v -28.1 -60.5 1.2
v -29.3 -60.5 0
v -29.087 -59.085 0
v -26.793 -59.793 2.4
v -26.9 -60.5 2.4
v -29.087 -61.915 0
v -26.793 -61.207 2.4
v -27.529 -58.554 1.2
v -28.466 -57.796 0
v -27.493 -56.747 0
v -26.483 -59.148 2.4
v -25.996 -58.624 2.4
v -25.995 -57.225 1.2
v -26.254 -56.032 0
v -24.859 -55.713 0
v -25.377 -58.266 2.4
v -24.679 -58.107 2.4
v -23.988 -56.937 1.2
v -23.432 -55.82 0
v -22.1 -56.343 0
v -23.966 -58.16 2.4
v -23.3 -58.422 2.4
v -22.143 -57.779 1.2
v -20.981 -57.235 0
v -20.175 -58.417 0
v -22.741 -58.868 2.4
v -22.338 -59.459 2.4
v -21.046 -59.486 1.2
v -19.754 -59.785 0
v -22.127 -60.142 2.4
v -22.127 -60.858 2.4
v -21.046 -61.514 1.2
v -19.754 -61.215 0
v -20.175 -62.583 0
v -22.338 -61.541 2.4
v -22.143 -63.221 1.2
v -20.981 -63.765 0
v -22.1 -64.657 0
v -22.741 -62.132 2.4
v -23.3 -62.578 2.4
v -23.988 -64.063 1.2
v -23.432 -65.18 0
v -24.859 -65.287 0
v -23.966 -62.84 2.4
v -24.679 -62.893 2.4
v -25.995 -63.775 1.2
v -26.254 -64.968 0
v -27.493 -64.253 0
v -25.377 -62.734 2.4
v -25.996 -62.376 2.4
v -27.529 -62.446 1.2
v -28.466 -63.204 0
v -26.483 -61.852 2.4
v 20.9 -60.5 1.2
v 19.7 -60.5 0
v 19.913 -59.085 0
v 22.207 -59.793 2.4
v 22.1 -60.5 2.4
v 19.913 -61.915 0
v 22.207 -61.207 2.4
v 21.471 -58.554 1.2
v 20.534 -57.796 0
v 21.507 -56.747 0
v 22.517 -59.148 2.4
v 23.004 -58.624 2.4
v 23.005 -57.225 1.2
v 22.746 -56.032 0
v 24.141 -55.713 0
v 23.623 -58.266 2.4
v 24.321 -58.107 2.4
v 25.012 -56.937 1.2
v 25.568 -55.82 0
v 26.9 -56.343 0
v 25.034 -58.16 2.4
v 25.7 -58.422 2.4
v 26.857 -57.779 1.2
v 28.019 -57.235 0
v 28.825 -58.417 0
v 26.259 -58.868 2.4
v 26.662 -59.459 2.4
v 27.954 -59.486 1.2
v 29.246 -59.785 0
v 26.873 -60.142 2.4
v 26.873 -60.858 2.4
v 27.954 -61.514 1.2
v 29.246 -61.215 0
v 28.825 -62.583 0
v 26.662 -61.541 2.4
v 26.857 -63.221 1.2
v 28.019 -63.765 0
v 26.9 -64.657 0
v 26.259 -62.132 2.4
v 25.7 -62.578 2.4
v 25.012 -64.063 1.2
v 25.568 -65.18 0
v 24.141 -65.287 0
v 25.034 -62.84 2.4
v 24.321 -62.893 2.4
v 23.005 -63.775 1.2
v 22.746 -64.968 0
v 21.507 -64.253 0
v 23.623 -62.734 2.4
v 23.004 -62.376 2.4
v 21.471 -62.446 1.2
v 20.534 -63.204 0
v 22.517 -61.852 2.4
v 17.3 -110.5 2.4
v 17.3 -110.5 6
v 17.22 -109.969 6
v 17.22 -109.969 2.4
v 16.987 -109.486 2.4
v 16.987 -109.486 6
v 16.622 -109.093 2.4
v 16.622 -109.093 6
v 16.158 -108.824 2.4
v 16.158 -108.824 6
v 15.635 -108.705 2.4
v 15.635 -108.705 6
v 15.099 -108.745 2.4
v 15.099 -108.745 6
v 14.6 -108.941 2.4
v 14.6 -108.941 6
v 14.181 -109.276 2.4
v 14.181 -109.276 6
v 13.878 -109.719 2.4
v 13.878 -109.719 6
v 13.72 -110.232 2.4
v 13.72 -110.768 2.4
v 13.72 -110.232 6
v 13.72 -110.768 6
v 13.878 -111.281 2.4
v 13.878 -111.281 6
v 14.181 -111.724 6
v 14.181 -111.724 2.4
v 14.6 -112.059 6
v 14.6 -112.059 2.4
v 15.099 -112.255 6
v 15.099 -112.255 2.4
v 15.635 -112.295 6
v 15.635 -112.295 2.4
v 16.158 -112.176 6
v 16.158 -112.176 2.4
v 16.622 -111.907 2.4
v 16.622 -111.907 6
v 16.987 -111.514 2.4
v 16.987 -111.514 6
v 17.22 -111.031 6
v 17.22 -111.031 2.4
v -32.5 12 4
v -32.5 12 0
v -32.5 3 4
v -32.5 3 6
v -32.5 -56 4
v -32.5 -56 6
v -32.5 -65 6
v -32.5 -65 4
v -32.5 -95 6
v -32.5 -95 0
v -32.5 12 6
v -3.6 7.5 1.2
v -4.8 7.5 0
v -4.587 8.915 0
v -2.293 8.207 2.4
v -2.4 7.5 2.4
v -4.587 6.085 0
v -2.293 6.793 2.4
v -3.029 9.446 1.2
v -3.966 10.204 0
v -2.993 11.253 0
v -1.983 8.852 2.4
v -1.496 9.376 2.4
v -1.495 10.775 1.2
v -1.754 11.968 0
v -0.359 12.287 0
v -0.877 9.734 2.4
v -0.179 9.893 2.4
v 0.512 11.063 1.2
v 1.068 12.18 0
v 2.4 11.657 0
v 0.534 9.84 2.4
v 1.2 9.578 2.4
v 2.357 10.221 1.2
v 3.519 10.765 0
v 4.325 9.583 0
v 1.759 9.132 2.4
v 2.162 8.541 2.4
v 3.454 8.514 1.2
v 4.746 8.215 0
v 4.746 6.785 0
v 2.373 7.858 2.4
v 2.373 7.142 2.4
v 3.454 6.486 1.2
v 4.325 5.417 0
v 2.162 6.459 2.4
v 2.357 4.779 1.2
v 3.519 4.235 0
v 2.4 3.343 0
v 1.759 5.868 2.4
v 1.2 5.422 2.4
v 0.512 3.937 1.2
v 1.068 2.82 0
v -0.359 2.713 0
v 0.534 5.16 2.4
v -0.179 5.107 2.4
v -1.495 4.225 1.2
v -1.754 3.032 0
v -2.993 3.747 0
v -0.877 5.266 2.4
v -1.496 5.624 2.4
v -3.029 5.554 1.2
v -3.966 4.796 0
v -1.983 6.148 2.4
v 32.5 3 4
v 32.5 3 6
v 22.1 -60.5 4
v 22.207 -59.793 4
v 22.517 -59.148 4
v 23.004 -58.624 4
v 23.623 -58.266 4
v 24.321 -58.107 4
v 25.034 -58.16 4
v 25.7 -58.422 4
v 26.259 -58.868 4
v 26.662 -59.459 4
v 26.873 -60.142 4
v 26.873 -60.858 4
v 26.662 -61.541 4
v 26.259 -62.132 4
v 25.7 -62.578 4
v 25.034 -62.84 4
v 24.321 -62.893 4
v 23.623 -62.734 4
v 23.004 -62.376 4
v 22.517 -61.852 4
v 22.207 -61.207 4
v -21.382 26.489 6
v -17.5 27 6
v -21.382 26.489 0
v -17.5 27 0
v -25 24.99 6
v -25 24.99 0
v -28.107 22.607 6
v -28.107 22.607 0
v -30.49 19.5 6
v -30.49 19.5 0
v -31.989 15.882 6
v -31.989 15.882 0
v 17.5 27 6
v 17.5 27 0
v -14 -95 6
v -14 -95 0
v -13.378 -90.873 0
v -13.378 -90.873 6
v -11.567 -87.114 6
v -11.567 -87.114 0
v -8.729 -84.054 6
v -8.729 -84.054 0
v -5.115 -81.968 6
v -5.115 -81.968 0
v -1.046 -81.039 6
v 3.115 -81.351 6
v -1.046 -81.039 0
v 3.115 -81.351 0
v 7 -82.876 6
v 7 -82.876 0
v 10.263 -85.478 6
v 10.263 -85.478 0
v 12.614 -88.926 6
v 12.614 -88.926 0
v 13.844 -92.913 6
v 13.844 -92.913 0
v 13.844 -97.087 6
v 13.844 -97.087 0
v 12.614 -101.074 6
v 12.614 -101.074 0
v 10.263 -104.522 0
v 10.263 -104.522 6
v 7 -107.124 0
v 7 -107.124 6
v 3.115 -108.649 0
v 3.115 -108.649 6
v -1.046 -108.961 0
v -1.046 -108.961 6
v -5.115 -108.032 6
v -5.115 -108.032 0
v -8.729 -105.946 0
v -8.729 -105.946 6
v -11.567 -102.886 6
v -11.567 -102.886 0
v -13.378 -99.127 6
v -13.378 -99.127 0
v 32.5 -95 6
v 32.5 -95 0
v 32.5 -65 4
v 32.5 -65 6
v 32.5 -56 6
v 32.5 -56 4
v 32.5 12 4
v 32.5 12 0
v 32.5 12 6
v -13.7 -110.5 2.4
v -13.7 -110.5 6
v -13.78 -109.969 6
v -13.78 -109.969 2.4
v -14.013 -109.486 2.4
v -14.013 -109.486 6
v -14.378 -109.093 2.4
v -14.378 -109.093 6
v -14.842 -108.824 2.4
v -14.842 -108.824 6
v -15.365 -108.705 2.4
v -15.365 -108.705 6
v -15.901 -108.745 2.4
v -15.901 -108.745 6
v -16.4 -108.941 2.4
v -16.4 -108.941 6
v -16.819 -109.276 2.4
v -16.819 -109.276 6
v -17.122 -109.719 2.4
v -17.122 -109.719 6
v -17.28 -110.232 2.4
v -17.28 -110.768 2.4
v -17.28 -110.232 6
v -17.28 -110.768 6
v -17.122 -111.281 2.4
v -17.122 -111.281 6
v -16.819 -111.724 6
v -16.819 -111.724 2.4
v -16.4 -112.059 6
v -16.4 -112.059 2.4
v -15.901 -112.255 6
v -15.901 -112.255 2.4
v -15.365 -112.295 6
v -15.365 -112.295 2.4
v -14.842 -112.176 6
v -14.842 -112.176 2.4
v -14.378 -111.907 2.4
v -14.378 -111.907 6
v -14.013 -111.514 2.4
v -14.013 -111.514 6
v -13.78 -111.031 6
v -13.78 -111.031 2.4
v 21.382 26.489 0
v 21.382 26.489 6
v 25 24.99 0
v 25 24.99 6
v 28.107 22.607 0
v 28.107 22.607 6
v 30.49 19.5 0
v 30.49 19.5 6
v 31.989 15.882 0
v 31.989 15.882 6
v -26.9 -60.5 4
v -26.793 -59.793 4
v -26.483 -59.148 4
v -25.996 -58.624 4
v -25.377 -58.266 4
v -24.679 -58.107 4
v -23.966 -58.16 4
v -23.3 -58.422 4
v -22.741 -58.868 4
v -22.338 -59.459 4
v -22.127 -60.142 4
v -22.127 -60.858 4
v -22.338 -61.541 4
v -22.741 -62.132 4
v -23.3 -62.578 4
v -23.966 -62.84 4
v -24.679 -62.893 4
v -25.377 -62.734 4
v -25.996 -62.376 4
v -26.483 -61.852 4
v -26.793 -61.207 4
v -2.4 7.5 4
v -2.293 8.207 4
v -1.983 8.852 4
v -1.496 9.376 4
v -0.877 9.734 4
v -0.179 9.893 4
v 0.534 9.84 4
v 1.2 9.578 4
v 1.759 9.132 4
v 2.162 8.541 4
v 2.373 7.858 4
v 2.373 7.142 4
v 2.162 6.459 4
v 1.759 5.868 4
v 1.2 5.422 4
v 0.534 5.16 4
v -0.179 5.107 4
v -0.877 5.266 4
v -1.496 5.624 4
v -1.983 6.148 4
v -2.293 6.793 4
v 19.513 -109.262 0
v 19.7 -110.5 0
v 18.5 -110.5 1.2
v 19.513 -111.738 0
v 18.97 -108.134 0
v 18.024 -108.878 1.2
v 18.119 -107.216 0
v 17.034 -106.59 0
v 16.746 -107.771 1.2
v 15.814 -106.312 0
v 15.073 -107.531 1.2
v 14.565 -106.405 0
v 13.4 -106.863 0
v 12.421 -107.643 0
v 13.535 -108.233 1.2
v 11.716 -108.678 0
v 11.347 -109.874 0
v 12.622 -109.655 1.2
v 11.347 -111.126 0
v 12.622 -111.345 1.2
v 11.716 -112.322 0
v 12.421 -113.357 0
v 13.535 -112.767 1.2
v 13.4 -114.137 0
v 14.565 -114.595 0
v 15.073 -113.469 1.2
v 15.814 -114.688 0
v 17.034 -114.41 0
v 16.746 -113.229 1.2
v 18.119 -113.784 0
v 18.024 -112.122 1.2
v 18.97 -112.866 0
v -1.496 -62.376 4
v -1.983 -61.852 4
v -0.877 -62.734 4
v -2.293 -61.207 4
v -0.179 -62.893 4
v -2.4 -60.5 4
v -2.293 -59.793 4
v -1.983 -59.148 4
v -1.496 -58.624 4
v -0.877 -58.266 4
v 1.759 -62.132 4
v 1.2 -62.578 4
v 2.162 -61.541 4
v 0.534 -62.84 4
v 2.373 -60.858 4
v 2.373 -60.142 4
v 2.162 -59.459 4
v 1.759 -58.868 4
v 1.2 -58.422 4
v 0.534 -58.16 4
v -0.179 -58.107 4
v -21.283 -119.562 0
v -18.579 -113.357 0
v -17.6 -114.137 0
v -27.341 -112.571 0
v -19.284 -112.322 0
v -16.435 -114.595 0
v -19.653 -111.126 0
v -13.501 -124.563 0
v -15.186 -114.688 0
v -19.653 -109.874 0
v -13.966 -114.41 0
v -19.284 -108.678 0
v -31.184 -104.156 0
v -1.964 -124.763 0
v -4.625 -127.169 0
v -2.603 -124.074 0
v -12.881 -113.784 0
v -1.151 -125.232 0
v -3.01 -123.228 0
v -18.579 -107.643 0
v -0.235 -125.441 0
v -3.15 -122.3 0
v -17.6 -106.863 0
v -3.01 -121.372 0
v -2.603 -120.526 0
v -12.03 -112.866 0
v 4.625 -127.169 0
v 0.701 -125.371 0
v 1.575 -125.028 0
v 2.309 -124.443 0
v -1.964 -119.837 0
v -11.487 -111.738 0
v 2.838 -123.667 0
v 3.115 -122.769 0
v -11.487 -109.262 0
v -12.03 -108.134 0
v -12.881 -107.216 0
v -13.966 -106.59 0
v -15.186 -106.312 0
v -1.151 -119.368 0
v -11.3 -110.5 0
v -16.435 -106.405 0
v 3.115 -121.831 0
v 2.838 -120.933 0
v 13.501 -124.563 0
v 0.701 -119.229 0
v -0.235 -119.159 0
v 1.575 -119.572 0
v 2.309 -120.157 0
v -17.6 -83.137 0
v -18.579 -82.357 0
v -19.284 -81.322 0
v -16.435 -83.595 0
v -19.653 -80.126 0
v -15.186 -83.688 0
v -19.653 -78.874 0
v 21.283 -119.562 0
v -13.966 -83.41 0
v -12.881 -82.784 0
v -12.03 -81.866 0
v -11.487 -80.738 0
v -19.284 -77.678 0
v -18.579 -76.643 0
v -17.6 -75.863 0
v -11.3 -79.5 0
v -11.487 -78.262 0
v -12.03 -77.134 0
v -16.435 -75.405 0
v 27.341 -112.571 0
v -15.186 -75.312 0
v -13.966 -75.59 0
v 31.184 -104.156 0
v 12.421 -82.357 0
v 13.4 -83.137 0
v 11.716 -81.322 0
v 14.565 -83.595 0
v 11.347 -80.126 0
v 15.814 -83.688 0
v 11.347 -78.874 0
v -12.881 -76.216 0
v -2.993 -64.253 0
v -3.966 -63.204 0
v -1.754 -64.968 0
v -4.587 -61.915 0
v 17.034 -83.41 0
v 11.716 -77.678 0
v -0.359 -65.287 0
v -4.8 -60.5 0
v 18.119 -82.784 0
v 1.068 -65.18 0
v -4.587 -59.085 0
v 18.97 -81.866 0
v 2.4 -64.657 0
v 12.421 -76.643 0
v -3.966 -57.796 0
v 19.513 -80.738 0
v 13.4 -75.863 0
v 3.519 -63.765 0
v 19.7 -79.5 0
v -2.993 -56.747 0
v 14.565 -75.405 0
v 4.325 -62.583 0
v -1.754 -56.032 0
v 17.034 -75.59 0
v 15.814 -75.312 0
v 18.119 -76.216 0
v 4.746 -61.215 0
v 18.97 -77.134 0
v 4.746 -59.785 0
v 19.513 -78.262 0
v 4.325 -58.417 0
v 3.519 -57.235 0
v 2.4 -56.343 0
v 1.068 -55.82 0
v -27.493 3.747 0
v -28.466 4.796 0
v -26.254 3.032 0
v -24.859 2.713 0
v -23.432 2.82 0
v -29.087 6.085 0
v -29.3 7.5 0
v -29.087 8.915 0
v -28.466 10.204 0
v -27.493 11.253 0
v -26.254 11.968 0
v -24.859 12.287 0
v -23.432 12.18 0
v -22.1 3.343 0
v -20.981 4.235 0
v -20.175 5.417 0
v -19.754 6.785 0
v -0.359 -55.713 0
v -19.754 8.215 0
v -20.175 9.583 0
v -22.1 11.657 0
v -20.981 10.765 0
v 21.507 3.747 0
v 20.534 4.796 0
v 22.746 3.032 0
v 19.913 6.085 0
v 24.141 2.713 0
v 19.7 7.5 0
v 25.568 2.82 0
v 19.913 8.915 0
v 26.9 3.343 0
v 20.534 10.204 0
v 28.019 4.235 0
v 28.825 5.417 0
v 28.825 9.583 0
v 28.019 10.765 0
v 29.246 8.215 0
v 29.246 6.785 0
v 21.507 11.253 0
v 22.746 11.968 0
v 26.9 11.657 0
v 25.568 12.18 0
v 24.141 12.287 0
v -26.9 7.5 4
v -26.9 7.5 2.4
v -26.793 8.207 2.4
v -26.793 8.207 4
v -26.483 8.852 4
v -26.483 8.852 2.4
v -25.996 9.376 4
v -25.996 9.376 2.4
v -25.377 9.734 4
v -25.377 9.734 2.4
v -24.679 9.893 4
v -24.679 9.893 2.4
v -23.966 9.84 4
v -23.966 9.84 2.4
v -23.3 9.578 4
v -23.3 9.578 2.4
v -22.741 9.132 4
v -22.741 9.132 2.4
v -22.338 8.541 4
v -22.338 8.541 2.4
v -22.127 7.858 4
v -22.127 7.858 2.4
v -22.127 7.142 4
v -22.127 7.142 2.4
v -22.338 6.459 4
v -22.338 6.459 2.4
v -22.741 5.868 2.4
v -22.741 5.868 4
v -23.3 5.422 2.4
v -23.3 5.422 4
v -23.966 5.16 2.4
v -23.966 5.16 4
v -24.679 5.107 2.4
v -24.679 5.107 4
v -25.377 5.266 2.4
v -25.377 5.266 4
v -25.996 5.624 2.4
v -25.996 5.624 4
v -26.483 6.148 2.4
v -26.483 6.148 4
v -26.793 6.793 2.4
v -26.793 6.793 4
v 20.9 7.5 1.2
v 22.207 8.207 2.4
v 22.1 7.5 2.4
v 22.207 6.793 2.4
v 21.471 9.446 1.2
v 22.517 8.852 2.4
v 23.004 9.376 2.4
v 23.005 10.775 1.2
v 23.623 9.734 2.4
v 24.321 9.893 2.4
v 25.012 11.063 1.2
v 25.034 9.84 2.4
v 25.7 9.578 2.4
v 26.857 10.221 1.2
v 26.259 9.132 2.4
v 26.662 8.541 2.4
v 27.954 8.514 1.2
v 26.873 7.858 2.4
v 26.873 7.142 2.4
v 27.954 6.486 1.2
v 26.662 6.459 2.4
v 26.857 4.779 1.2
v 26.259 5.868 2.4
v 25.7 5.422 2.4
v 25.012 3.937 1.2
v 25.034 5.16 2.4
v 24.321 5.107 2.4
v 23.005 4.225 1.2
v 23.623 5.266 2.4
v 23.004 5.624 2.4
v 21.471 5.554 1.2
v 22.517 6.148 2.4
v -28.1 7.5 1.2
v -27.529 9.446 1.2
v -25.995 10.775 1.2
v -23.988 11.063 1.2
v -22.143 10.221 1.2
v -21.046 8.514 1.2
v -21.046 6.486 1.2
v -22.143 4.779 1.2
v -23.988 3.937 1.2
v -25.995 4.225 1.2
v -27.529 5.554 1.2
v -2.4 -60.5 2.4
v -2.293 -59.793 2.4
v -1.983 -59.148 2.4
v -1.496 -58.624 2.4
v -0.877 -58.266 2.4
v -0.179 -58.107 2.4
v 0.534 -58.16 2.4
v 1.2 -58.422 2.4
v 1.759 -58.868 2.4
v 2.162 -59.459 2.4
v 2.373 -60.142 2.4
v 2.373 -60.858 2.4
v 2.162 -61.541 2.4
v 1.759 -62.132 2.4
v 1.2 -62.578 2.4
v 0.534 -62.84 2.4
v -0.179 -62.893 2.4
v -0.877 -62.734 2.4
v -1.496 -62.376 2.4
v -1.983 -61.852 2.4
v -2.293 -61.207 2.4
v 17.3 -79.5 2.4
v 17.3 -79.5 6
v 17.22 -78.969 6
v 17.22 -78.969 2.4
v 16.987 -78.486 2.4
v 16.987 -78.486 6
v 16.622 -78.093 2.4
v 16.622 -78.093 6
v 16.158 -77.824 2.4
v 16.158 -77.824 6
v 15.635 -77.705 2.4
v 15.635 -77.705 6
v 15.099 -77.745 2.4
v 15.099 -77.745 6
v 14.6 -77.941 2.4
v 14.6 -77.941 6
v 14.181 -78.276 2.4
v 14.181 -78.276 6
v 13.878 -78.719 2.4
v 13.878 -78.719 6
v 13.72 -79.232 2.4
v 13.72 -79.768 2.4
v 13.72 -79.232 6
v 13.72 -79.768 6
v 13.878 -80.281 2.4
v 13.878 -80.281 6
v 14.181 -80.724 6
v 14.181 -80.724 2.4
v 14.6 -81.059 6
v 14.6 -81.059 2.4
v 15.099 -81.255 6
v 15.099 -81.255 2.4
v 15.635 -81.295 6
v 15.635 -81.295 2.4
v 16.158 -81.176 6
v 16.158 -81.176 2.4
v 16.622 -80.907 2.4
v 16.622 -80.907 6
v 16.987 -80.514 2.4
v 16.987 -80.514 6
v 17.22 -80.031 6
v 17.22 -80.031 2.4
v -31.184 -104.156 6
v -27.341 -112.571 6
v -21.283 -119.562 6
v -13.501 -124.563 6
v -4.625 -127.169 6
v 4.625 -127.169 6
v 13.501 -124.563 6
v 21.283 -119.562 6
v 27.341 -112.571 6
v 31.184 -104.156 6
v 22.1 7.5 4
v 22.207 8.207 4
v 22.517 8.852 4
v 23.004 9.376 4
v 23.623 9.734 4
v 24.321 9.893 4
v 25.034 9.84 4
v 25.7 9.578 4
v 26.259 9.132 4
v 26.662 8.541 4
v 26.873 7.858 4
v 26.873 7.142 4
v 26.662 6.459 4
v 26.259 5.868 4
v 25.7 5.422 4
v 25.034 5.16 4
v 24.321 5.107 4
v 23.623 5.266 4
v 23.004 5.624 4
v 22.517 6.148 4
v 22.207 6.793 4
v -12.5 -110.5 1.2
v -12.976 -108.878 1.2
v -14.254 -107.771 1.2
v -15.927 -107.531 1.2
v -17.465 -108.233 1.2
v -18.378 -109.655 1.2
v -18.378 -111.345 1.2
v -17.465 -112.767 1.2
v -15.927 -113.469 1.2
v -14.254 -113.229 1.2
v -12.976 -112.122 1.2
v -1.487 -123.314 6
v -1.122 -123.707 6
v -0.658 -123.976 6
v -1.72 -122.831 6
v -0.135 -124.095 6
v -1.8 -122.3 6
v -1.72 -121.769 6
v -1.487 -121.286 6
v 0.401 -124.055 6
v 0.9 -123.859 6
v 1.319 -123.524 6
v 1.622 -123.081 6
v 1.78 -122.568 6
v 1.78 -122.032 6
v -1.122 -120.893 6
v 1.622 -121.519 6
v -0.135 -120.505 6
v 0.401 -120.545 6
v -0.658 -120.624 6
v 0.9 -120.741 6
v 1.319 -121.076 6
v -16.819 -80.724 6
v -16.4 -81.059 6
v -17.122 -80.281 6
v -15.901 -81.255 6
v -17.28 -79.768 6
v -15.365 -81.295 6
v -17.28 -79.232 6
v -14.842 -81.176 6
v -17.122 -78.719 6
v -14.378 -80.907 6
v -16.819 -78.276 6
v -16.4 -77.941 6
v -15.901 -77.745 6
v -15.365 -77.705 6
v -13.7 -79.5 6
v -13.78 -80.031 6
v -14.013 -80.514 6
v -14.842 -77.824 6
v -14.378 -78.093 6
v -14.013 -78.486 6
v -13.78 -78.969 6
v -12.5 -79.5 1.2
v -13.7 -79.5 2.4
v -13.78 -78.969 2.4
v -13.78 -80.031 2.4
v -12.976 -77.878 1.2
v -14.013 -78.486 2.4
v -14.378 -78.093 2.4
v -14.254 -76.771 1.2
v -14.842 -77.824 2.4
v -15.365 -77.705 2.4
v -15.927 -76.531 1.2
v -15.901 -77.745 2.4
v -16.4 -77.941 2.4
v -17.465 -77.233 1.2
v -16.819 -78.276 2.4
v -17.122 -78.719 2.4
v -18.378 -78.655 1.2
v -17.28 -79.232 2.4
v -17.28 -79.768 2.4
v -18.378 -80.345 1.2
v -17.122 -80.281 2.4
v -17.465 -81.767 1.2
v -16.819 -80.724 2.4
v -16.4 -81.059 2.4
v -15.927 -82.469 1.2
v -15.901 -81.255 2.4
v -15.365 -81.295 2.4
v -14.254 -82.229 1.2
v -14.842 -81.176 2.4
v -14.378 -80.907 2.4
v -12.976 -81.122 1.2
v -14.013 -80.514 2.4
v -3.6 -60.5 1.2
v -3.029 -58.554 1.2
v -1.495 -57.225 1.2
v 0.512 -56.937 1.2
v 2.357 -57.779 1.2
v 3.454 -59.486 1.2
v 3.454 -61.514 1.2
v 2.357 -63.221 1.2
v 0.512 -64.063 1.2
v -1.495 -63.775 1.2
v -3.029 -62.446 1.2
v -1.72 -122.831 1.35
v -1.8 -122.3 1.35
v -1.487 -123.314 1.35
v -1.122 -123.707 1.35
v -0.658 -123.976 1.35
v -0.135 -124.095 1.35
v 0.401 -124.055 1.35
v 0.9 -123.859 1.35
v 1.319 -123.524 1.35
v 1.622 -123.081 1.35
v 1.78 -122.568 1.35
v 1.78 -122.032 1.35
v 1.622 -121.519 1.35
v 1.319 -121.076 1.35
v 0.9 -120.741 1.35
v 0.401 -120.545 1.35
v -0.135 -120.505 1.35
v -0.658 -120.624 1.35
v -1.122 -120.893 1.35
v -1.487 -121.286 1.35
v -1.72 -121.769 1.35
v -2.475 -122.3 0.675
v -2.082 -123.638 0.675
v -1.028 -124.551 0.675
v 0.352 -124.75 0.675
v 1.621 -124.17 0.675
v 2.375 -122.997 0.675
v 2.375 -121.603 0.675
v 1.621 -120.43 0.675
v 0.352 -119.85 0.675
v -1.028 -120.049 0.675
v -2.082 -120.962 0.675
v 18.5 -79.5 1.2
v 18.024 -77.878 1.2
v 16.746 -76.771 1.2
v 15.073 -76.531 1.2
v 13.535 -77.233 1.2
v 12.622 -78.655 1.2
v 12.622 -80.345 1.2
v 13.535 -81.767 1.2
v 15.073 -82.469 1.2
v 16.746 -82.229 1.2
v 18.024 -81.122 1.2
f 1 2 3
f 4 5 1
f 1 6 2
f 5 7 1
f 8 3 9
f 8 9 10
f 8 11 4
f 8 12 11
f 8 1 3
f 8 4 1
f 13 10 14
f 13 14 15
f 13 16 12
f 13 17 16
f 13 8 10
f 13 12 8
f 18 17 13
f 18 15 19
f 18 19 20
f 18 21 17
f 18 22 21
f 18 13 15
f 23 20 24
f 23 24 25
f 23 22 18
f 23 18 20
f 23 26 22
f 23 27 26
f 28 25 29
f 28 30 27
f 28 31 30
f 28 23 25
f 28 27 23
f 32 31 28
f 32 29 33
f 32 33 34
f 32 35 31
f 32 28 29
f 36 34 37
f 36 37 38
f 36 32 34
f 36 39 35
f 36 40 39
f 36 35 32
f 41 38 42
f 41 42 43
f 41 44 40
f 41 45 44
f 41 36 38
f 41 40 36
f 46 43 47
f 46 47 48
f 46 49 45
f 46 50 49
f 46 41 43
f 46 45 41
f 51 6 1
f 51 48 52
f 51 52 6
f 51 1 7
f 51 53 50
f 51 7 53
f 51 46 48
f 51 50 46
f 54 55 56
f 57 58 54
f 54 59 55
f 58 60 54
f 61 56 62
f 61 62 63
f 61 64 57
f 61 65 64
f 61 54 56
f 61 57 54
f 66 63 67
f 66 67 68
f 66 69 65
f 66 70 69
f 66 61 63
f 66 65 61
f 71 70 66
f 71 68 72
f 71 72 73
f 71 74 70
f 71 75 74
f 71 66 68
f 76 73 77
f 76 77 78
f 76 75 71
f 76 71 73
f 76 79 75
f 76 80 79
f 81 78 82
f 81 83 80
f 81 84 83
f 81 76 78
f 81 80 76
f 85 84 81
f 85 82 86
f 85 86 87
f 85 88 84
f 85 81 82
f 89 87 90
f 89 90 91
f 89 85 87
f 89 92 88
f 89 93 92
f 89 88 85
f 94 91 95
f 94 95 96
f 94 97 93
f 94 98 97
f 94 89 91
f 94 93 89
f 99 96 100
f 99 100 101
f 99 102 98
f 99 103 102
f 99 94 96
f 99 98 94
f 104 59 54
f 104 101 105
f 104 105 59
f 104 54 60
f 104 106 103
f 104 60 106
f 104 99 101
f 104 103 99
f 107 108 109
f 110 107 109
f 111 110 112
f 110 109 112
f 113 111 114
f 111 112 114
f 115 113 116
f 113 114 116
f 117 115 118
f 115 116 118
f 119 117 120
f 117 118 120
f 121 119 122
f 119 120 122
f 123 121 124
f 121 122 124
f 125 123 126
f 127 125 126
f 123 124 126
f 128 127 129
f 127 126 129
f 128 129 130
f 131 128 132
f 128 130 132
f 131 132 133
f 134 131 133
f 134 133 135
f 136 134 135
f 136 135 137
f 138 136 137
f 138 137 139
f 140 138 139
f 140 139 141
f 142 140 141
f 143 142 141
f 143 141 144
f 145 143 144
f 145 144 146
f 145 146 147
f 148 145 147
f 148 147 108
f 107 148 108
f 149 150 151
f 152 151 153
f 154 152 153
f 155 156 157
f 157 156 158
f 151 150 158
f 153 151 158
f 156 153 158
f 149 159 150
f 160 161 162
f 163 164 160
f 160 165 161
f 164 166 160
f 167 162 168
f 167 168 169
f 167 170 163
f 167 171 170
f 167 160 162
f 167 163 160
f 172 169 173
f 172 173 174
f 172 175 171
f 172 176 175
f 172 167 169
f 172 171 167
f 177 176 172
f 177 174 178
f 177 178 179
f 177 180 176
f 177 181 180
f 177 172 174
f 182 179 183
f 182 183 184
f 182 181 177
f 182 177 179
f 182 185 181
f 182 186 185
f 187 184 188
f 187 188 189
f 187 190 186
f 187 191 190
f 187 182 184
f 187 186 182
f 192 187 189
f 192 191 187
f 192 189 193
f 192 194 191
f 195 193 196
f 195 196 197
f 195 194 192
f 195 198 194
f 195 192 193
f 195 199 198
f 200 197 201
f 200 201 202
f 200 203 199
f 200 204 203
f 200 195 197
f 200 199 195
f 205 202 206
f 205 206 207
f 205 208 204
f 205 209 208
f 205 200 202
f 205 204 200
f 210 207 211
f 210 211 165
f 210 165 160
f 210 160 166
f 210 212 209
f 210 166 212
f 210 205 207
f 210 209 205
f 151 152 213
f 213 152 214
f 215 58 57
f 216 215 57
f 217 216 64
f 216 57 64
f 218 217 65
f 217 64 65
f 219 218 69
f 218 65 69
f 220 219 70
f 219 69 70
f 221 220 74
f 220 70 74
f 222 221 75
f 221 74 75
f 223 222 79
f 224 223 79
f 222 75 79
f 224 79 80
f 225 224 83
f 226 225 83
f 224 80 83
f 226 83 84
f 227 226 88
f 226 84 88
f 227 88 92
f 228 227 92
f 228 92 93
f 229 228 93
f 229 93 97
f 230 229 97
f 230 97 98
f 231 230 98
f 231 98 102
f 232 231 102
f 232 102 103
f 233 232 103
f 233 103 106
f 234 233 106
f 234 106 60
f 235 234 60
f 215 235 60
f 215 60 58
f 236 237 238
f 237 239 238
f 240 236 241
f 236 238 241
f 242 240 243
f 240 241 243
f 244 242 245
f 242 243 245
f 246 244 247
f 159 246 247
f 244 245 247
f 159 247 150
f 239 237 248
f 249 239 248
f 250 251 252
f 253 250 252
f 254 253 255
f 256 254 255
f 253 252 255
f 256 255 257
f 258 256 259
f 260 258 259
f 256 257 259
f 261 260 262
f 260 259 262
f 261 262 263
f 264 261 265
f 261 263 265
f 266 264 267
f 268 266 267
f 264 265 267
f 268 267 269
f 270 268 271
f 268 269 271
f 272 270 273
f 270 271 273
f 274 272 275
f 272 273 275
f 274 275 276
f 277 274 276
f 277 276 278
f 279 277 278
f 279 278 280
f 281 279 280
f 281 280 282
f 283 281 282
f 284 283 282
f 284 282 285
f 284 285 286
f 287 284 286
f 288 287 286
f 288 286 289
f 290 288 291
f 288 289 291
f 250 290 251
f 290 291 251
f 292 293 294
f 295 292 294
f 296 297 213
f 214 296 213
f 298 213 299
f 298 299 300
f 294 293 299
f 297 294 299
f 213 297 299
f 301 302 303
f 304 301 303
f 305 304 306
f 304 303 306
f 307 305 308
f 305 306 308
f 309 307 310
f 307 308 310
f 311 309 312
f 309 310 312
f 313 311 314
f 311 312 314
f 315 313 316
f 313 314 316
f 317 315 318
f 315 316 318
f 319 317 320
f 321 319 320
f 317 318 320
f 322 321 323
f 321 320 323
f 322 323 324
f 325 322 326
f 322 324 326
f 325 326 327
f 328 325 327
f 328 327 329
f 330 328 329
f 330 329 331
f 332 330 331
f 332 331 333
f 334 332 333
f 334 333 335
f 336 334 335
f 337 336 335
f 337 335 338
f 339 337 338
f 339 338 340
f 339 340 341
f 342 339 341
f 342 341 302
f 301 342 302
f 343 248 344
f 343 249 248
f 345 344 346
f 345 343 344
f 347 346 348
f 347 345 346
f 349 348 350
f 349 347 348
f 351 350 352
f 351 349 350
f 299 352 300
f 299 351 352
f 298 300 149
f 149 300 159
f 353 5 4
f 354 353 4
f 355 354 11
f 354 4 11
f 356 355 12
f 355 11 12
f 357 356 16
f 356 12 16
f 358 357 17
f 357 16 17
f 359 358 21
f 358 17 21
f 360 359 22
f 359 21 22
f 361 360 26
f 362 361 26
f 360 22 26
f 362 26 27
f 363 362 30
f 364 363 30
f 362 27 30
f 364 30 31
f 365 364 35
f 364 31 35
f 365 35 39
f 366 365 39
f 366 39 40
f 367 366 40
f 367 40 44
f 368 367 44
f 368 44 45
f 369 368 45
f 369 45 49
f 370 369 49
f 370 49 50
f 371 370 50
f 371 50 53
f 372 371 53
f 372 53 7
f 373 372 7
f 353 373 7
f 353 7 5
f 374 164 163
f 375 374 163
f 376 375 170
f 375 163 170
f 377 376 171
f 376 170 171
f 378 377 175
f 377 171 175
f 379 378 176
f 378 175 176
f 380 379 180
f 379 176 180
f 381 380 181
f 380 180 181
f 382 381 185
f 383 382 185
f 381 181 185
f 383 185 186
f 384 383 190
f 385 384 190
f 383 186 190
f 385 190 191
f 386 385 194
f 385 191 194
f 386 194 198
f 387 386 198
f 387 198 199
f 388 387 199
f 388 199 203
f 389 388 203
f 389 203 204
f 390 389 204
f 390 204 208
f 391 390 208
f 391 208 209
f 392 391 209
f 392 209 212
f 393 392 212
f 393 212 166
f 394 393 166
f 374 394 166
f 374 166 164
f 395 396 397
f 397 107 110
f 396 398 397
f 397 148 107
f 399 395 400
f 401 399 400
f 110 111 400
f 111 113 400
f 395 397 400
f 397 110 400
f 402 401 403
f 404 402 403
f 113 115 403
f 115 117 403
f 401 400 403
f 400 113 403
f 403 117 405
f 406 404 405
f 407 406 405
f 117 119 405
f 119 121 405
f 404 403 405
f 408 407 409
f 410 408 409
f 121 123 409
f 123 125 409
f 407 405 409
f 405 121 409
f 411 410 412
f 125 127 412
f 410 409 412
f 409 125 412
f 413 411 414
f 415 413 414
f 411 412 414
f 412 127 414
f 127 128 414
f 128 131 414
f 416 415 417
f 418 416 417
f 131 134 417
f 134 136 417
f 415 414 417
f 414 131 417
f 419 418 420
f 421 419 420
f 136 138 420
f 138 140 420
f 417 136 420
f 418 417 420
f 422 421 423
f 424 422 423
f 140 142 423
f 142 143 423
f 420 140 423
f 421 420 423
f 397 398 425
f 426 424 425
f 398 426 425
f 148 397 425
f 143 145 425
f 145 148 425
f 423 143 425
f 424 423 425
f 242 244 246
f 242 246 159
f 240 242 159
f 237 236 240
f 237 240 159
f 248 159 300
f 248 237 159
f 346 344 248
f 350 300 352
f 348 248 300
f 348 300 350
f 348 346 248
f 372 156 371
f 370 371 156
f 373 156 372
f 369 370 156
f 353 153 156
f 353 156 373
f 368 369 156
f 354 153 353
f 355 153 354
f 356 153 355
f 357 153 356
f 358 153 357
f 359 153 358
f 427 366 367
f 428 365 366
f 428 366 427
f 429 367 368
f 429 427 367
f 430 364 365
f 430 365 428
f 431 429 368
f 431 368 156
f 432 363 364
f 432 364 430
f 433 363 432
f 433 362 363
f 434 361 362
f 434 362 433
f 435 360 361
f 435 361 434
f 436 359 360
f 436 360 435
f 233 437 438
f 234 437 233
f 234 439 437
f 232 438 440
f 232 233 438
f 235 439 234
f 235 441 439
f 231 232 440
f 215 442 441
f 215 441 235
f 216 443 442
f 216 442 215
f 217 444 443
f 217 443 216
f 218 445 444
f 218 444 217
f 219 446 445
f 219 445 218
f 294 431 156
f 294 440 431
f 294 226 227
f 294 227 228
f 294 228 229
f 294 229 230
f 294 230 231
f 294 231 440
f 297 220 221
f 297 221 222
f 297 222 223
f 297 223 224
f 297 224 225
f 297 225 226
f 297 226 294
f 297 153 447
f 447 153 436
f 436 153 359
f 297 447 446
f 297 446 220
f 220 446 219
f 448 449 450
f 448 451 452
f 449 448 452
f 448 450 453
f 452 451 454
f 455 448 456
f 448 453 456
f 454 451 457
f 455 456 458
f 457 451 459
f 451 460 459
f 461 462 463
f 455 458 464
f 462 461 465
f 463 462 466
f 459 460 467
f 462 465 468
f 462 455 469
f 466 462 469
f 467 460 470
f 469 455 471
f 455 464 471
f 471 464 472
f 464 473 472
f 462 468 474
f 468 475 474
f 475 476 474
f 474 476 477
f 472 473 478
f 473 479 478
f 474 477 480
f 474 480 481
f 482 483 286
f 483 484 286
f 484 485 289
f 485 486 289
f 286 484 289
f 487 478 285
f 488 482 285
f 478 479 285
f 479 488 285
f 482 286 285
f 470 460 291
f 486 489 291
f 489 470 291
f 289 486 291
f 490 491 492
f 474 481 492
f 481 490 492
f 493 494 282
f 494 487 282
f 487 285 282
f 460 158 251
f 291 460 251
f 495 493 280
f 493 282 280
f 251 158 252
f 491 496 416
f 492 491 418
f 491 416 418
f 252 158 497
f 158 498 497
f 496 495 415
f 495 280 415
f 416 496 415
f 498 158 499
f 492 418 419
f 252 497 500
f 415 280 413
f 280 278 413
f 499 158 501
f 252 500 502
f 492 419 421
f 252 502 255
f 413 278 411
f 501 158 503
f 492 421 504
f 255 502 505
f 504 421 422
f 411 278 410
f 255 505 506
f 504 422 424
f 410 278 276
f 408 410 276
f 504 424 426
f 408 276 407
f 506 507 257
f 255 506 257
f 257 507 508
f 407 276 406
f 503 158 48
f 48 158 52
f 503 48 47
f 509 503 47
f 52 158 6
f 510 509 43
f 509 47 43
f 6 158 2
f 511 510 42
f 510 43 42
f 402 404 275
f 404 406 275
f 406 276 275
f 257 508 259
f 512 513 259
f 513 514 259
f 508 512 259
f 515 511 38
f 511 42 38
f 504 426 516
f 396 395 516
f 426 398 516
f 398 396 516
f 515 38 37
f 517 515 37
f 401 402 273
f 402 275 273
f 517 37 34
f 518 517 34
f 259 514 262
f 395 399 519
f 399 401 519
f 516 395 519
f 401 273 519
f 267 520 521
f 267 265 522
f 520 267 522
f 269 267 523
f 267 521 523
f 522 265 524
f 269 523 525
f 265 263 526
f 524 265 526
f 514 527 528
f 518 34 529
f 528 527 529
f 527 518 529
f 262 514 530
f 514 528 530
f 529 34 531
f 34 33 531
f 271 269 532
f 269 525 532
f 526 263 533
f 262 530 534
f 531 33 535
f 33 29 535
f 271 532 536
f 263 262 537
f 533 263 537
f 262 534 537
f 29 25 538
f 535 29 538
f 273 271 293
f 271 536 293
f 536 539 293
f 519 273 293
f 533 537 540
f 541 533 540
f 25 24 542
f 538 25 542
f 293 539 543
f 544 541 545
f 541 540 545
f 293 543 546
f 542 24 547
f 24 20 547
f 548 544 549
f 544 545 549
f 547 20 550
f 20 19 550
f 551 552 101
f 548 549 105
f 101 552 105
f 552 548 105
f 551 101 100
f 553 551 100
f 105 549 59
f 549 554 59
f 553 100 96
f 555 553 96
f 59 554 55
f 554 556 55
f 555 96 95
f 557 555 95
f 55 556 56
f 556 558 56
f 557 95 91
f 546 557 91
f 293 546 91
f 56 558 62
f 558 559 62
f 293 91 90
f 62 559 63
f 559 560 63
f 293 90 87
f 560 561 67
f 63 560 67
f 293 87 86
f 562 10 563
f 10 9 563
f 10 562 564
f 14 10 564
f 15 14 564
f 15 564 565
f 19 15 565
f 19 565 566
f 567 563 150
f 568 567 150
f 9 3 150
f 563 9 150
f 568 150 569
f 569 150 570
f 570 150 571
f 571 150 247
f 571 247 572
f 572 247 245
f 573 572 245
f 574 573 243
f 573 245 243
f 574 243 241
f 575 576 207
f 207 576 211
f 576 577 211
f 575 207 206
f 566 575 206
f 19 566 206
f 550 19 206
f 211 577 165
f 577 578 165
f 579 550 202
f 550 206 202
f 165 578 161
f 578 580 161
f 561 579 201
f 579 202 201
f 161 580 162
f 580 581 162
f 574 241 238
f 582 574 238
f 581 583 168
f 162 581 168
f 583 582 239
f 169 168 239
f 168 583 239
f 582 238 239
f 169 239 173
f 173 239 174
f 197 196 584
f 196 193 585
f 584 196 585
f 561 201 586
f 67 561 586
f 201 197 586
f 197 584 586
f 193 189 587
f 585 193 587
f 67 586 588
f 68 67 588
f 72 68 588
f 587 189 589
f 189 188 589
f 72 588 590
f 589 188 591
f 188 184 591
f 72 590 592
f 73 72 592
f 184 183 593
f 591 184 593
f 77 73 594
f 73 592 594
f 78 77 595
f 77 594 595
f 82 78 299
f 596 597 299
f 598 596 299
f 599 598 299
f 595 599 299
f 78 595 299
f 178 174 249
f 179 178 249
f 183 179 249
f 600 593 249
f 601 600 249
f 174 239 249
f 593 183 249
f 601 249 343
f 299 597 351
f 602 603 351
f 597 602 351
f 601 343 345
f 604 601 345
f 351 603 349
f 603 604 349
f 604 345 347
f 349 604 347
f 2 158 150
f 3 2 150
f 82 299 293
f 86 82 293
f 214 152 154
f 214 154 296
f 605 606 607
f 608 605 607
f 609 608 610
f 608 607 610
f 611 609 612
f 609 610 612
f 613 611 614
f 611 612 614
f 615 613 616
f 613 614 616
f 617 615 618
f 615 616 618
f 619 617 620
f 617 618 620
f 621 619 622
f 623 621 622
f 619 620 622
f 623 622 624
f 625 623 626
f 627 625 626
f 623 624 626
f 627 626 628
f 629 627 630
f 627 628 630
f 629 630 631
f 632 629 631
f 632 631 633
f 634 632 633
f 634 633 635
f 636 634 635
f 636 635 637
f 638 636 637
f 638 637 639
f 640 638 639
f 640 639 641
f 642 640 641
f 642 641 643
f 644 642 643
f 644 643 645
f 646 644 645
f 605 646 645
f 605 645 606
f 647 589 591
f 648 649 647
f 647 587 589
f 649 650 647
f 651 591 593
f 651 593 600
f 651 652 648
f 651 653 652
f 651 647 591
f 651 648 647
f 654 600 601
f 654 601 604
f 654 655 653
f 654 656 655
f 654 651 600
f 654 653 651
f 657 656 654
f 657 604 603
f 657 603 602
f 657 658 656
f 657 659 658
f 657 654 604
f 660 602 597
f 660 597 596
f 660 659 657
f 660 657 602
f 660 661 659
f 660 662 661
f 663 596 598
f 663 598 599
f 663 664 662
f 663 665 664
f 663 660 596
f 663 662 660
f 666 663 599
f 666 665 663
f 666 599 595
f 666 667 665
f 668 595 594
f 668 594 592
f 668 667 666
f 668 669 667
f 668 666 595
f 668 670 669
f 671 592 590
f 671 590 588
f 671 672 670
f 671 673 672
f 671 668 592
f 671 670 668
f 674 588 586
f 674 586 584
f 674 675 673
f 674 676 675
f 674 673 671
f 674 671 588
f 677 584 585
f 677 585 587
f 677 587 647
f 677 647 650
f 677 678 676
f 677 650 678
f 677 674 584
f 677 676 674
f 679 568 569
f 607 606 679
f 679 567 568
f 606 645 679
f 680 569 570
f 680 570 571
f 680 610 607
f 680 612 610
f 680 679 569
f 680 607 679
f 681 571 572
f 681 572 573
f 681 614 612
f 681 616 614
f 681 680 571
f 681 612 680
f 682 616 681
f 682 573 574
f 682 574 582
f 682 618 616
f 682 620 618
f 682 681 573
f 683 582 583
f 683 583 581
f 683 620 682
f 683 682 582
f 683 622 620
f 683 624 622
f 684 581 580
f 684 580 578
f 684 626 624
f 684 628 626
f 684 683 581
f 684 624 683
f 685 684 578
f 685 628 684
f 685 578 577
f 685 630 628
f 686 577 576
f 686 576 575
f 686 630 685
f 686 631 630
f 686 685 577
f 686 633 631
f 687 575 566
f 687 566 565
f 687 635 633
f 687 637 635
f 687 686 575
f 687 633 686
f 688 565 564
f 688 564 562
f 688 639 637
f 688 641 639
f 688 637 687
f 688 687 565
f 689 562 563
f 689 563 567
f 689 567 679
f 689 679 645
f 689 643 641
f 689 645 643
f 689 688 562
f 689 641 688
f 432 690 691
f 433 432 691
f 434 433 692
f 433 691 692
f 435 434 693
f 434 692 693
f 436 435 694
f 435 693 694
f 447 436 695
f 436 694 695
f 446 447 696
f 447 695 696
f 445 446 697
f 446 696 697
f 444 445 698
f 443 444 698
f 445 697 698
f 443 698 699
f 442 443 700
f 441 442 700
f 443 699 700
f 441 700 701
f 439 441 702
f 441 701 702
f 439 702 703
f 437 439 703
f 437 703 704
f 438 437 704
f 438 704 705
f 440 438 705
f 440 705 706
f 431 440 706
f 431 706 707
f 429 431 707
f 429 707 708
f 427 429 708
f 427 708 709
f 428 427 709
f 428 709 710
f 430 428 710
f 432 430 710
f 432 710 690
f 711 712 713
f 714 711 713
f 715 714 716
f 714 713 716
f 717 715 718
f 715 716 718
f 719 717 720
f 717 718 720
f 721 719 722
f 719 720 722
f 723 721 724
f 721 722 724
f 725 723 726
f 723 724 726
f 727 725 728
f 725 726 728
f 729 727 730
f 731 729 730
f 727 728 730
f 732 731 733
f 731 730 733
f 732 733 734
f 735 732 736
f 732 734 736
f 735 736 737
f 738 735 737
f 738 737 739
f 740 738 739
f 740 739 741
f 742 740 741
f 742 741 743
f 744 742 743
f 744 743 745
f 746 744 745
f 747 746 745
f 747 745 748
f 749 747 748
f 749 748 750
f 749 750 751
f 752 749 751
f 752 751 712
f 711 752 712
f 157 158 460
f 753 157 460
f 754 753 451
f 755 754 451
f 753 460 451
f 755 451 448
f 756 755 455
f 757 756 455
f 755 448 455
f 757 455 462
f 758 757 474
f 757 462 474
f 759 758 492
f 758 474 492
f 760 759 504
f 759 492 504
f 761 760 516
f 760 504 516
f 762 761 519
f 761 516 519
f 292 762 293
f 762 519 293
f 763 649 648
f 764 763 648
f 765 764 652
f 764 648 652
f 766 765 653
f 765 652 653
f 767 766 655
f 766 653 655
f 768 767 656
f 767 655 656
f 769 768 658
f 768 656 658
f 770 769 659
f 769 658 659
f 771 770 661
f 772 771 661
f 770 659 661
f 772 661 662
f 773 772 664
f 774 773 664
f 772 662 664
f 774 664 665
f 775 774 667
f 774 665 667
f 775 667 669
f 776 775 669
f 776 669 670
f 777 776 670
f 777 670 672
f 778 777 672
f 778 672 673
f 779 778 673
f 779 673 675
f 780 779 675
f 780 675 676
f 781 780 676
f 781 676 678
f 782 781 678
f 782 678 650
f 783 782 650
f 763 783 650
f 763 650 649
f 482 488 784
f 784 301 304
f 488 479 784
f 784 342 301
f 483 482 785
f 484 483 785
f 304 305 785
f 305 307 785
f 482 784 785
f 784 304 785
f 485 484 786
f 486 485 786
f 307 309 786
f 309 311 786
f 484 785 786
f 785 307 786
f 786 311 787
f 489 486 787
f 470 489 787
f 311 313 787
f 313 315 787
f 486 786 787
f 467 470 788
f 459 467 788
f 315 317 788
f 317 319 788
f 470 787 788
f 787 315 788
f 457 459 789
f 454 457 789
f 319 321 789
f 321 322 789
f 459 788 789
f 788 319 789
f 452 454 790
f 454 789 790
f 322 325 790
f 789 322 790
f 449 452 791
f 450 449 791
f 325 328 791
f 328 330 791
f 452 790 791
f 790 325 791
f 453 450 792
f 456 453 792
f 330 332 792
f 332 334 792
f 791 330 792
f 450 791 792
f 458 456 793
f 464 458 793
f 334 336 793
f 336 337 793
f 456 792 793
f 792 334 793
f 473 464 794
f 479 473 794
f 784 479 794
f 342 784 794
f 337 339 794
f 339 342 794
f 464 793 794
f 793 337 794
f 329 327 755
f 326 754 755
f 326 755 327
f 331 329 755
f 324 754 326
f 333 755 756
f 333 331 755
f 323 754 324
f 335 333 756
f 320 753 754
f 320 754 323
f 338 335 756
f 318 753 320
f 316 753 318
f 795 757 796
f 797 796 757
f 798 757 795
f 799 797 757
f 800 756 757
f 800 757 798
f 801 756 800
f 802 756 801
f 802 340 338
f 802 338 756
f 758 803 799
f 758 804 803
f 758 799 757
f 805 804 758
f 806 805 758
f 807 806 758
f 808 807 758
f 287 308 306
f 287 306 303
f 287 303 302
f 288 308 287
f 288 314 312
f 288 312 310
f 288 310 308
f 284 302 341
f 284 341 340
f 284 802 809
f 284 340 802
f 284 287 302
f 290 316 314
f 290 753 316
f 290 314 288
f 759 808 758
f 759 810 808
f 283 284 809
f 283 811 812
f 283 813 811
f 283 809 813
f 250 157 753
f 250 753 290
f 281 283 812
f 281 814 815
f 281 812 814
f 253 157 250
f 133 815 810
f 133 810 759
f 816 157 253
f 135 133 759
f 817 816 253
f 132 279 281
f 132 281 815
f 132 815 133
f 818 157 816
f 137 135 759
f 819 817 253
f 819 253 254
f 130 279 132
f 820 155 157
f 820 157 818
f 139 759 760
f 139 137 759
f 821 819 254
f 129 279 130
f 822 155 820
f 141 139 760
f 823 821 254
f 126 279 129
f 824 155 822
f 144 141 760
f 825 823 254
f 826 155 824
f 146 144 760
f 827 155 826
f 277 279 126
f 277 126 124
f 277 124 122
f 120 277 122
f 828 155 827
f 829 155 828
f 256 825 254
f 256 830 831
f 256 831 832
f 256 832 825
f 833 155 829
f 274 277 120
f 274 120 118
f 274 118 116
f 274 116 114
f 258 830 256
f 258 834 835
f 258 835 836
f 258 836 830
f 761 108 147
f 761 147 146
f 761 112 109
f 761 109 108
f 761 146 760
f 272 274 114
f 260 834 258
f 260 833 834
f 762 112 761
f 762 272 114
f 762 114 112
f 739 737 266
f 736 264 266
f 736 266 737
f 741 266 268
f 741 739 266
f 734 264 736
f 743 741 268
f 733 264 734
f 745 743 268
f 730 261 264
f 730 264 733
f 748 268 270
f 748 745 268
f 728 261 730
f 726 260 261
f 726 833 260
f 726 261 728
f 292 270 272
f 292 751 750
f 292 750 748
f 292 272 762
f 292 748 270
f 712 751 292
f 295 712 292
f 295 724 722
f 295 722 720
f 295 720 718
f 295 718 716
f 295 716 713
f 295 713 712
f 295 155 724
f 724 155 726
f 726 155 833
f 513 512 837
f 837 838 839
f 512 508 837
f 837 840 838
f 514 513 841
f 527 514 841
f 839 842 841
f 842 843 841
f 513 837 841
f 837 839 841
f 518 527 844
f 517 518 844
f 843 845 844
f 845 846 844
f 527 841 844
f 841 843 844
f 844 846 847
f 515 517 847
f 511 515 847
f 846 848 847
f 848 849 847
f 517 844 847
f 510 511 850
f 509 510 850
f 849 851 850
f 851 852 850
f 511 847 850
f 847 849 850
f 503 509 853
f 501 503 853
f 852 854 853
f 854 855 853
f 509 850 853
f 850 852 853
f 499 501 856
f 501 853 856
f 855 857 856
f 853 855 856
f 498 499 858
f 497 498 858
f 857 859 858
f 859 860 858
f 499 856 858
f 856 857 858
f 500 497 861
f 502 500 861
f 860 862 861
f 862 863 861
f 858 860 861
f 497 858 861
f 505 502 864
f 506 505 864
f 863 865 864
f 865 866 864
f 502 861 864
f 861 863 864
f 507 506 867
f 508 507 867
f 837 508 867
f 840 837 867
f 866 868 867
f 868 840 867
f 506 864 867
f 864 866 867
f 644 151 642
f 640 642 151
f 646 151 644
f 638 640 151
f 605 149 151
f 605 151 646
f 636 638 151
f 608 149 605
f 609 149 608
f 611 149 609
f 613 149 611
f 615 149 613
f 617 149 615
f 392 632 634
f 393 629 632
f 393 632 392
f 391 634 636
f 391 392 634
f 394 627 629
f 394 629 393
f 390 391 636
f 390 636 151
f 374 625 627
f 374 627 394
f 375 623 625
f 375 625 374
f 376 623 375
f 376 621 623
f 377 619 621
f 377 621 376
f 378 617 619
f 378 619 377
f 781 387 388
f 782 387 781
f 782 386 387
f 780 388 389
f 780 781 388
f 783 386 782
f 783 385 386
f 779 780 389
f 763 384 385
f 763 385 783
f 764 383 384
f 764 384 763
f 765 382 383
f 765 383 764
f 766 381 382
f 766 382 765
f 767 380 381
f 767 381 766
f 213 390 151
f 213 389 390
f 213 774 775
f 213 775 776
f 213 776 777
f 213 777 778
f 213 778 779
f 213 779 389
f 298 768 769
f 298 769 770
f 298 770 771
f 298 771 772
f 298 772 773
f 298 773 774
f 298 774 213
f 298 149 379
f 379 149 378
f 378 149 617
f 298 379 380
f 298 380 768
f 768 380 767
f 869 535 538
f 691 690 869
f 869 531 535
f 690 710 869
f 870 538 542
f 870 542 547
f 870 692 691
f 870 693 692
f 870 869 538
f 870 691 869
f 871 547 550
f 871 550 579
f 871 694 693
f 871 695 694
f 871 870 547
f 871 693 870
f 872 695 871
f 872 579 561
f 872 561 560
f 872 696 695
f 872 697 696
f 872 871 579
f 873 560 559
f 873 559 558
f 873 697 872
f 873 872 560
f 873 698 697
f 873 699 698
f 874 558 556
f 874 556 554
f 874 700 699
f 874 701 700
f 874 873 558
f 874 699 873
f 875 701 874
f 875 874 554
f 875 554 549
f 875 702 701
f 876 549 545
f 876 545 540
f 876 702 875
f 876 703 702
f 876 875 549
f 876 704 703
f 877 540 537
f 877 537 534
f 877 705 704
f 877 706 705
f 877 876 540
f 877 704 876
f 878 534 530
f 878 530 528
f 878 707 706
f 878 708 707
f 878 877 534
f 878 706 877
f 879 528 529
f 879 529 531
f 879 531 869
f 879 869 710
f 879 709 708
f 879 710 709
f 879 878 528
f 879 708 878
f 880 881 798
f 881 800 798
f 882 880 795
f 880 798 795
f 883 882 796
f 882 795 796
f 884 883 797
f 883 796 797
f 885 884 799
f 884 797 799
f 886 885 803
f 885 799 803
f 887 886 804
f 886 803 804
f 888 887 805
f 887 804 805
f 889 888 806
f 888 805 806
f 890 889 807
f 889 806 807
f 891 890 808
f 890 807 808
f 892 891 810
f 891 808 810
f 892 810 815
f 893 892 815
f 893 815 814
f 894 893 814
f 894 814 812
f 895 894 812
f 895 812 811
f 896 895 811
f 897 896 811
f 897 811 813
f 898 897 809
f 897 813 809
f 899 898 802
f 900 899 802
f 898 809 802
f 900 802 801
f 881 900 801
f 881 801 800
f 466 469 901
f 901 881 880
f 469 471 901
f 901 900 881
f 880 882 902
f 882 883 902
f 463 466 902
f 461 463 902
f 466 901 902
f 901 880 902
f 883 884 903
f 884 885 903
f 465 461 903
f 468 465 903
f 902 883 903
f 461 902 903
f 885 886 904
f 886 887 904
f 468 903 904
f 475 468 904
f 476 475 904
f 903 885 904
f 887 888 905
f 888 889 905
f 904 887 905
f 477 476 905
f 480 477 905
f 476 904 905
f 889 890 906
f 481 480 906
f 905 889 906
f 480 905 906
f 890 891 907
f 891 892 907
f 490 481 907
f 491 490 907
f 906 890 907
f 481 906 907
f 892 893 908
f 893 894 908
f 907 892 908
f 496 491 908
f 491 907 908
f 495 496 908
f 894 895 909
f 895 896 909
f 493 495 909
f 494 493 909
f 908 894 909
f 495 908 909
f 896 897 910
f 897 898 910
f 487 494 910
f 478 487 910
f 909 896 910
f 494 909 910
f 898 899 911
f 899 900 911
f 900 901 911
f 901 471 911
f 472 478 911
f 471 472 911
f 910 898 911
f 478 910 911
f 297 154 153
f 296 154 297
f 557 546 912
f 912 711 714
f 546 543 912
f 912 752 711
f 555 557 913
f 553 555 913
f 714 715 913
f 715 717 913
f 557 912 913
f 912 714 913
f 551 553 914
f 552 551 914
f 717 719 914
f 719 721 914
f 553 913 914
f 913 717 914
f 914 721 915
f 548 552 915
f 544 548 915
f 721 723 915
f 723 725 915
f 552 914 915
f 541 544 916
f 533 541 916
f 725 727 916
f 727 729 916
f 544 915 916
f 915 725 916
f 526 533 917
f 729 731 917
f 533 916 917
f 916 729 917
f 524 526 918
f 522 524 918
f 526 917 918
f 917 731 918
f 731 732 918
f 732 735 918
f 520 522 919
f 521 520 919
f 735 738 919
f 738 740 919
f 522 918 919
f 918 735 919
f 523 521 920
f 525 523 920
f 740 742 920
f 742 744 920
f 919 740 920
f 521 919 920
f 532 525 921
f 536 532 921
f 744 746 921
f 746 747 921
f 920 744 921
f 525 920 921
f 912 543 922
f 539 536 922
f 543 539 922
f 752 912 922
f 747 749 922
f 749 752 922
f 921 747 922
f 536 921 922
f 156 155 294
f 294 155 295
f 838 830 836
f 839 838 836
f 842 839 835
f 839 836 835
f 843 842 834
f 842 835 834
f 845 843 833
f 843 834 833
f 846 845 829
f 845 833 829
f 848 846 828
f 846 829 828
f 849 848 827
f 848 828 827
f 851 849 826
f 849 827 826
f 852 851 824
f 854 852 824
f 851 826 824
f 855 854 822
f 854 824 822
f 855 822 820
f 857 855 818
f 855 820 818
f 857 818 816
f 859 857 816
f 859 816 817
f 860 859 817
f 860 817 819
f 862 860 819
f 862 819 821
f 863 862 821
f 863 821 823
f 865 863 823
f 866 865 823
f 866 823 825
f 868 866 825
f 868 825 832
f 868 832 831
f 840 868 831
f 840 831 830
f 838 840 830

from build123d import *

# Parameters (mm, degrees)
BOSS_EXTRUDE1_DEPTH                             = 6
M3_CLEARANCE_HOLE1_D                            = 3.6
M3_CLEARANCE_HOLE1_DEPTH                        = 6
M3_CLEARANCE_HOLE1_TIP                          = 1.081549114
FILLET1_R                                       = 15
SKETCH4_W                                       = 65
SKETCH4_H                                       = 9
SKETCH4_W_2                                     = 32.5
CUT_EXTRUDE1_DEPTH                              = 2
M4_CLEARANCE_HOLE1_D                            = 4.8
M4_CLEARANCE_HOLE1_DEPTH                        = 6
M4_CLEARANCE_HOLE1_TIP                          = 1.442065486
CHAMFER1_SIZE                                   = 2.4
SKETCH7_W                                       = 65
SKETCH7_H                                       = 78
CUT_EXTRUDE3_DEPTH                              = 132.713704678
FILLET2_R                                       = 15
CSK_FOR_M3_FLAT_HEAD_MACHINE_SCREW1_D           = 3.6
CSK_FOR_M3_FLAT_HEAD_MACHINE_SCREW1_DEPTH       = 20
CSK_FOR_M3_FLAT_HEAD_MACHINE_SCREW1_CSINK_D     = 6.3
CSK_FOR_M3_FLAT_HEAD_MACHINE_SCREW1_CSINK_ANGLE = 90
CSK_FOR_M3_FLAT_HEAD_MACHINE_SCREW1_TIP         = 1.081549114


with BuildPart() as part:
    # Sketch1 → Boss-Extrude1 (new body)
    with BuildSketch(Plane.XY):
        with BuildLine():
            Line((-32.5, 95), (-32.5, -95))
            ThreePointArc((-32.5, -95), (0, -62.5), (32.5, -95))
            Line((32.5, -95), (32.5, 95))
            Line((32.5, 95), (-32.5, 95))
        make_face()
        with BuildLine():
            ThreePointArc((32.5, -95), (0, -62.5), (-32.5, -95))
            Line((-32.5, -95), (-15.5, -95))
            Line((-15.5, -95), (-15.5, -79.5))
            Line((-15.5, -79.5), (15.5, -79.5))
            Line((15.5, -79.5), (15.5, -95))
            Line((15.5, -95), (32.5, -95))
        make_face()
        with BuildLine():
            Line((-15.5, -95), (-32.5, -95))
            ThreePointArc((-32.5, -95), (0, -127.5), (32.5, -95))
            Line((32.5, -95), (15.5, -95))
            Line((15.5, -95), (15.5, -110.5))
            Line((15.5, -110.5), (-15.5, -110.5))
            Line((-15.5, -110.5), (-15.5, -95))
        make_face()
        with BuildLine():
            Line((-14, -95), (-15.5, -95))
            Line((-15.5, -95), (-15.5, -110.5))
            Line((-15.5, -110.5), (15.5, -110.5))
            Line((15.5, -110.5), (15.5, -95))
            Line((15.5, -95), (14, -95))
            ThreePointArc((14, -95), (0, -109), (-14, -95))
        make_face()
        with BuildLine():
            Line((-15.5, -79.5), (-15.5, -95))
            Line((-15.5, -95), (-14, -95))
            ThreePointArc((-14, -95), (0, -81), (14, -95))
            Line((14, -95), (15.5, -95))
            Line((15.5, -95), (15.5, -79.5))
            Line((15.5, -79.5), (-15.5, -79.5))
        make_face()
    extrude(amount=BOSS_EXTRUDE1_DEPTH)

    # M3 Clearance Hole1
    with Locations(Plane(origin=(0, 0, 0), x_dir=(-1, 0, 0), z_dir=(0, 0, -1))):
        with Locations((-15.5, -110.5), (15.5, -110.5), (15.5, -79.5), (-15.5, -79.5)):
            Hole(M3_CLEARANCE_HOLE1_D / 2, depth=M3_CLEARANCE_HOLE1_DEPTH)
            with Locations((0, 0, -(M3_CLEARANCE_HOLE1_DEPTH + M3_CLEARANCE_HOLE1_TIP / 2))):  # 118° drill point
                Cone(0, M3_CLEARANCE_HOLE1_D / 2, M3_CLEARANCE_HOLE1_TIP, mode=Mode.SUBTRACT)

    # Fillet1
    fillet1_edges = [part.edges().sort_by_distance(p)[0] for p in [
        (-32.5, 95, 3),
        (32.5, 95, 3),
    ]]
    fillet(fillet1_edges, radius=FILLET1_R)

    # Sketch4 → Cut-Extrude1 (cut)
    with BuildSketch(Plane.XY.offset(6)):
        with Locations((0, 75.5)):
            Rectangle(SKETCH4_W, SKETCH4_H)
        with Locations((-16.25, 7.5)):
            Rectangle(SKETCH4_W_2, SKETCH4_H)
        with Locations((16.25, 7.5)):
            Rectangle(SKETCH4_W_2, SKETCH4_H)
        with Locations((0, -60.5)):
            Rectangle(SKETCH4_W, SKETCH4_H)
    extrude(amount=-CUT_EXTRUDE1_DEPTH, mode=Mode.SUBTRACT)

    # M4 Clearance Hole1
    with Locations(Plane.XY.offset(4)):
        with Locations((-24.5, -60.5), (-24.5, 75.5), (24.5, 75.5), (0, 75.5), (-24.5, 7.5), (0, 7.5), (24.5, 7.5), (24.5, -60.5), (0, -60.5)):
            Hole(M4_CLEARANCE_HOLE1_D / 2, depth=M4_CLEARANCE_HOLE1_DEPTH)
            with Locations((0, 0, -(M4_CLEARANCE_HOLE1_DEPTH + M4_CLEARANCE_HOLE1_TIP / 2))):  # 118° drill point
                Cone(0, M4_CLEARANCE_HOLE1_D / 2, M4_CLEARANCE_HOLE1_TIP, mode=Mode.SUBTRACT)

    # Chamfer1
    chamfer1_edges = [part.edges().sort_by_distance(p)[0] for p in [
        (-22.1, -60.5, 0),
        (2.4, -60.5, 0),
        (26.9, -60.5, 0),
        (26.9, 7.5, 0),
        (2.4, 7.5, 0),
        (-22.1, 7.5, 0),
        (2.4, 75.5, 0),
        (26.9, 75.5, 0),
        (-22.1, 75.5, 0),
        (13.7, -79.5, 0),
        (-17.3, -79.5, 0),
        (-17.3, -110.5, 0),
        (13.7, -110.5, 0),
    ]]
    chamfer(chamfer1_edges, length=CHAMFER1_SIZE)

    # Sketch7 → Cut-Extrude3 (cut, through all)
    with BuildSketch(Plane.XY.offset(6)):
        with Locations((0, 66)):
            Rectangle(SKETCH7_W, SKETCH7_H)
    extrude(amount=-CUT_EXTRUDE3_DEPTH, mode=Mode.SUBTRACT)

    # Fillet2
    fillet2_edges = [part.edges().sort_by_distance(p)[0] for p in [
        (32.5, 27, 3),
        (-32.5, 27, 3),
    ]]
    fillet(fillet2_edges, radius=FILLET2_R - 0.0001)  # a hair under: the kernel refuses the full size

    # CSK for M3 Flat Head Machine Screw1
    with Locations(Plane(origin=(0, 0, 0), x_dir=(1, 0, 0), z_dir=(0, 0, -1))):
        with Locations((0, 122.3)):
            CounterSinkHole(CSK_FOR_M3_FLAT_HEAD_MACHINE_SCREW1_D / 2, CSK_FOR_M3_FLAT_HEAD_MACHINE_SCREW1_CSINK_D / 2, depth=CSK_FOR_M3_FLAT_HEAD_MACHINE_SCREW1_DEPTH, counter_sink_angle=CSK_FOR_M3_FLAT_HEAD_MACHINE_SCREW1_CSINK_ANGLE)
            with Locations((0, 0, -(CSK_FOR_M3_FLAT_HEAD_MACHINE_SCREW1_DEPTH + CSK_FOR_M3_FLAT_HEAD_MACHINE_SCREW1_TIP / 2))):  # 118° drill point
                Cone(0, CSK_FOR_M3_FLAT_HEAD_MACHINE_SCREW1_D / 2, CSK_FOR_M3_FLAT_HEAD_MACHINE_SCREW1_TIP, mode=Mode.SUBTRACT)


solid = part.part
